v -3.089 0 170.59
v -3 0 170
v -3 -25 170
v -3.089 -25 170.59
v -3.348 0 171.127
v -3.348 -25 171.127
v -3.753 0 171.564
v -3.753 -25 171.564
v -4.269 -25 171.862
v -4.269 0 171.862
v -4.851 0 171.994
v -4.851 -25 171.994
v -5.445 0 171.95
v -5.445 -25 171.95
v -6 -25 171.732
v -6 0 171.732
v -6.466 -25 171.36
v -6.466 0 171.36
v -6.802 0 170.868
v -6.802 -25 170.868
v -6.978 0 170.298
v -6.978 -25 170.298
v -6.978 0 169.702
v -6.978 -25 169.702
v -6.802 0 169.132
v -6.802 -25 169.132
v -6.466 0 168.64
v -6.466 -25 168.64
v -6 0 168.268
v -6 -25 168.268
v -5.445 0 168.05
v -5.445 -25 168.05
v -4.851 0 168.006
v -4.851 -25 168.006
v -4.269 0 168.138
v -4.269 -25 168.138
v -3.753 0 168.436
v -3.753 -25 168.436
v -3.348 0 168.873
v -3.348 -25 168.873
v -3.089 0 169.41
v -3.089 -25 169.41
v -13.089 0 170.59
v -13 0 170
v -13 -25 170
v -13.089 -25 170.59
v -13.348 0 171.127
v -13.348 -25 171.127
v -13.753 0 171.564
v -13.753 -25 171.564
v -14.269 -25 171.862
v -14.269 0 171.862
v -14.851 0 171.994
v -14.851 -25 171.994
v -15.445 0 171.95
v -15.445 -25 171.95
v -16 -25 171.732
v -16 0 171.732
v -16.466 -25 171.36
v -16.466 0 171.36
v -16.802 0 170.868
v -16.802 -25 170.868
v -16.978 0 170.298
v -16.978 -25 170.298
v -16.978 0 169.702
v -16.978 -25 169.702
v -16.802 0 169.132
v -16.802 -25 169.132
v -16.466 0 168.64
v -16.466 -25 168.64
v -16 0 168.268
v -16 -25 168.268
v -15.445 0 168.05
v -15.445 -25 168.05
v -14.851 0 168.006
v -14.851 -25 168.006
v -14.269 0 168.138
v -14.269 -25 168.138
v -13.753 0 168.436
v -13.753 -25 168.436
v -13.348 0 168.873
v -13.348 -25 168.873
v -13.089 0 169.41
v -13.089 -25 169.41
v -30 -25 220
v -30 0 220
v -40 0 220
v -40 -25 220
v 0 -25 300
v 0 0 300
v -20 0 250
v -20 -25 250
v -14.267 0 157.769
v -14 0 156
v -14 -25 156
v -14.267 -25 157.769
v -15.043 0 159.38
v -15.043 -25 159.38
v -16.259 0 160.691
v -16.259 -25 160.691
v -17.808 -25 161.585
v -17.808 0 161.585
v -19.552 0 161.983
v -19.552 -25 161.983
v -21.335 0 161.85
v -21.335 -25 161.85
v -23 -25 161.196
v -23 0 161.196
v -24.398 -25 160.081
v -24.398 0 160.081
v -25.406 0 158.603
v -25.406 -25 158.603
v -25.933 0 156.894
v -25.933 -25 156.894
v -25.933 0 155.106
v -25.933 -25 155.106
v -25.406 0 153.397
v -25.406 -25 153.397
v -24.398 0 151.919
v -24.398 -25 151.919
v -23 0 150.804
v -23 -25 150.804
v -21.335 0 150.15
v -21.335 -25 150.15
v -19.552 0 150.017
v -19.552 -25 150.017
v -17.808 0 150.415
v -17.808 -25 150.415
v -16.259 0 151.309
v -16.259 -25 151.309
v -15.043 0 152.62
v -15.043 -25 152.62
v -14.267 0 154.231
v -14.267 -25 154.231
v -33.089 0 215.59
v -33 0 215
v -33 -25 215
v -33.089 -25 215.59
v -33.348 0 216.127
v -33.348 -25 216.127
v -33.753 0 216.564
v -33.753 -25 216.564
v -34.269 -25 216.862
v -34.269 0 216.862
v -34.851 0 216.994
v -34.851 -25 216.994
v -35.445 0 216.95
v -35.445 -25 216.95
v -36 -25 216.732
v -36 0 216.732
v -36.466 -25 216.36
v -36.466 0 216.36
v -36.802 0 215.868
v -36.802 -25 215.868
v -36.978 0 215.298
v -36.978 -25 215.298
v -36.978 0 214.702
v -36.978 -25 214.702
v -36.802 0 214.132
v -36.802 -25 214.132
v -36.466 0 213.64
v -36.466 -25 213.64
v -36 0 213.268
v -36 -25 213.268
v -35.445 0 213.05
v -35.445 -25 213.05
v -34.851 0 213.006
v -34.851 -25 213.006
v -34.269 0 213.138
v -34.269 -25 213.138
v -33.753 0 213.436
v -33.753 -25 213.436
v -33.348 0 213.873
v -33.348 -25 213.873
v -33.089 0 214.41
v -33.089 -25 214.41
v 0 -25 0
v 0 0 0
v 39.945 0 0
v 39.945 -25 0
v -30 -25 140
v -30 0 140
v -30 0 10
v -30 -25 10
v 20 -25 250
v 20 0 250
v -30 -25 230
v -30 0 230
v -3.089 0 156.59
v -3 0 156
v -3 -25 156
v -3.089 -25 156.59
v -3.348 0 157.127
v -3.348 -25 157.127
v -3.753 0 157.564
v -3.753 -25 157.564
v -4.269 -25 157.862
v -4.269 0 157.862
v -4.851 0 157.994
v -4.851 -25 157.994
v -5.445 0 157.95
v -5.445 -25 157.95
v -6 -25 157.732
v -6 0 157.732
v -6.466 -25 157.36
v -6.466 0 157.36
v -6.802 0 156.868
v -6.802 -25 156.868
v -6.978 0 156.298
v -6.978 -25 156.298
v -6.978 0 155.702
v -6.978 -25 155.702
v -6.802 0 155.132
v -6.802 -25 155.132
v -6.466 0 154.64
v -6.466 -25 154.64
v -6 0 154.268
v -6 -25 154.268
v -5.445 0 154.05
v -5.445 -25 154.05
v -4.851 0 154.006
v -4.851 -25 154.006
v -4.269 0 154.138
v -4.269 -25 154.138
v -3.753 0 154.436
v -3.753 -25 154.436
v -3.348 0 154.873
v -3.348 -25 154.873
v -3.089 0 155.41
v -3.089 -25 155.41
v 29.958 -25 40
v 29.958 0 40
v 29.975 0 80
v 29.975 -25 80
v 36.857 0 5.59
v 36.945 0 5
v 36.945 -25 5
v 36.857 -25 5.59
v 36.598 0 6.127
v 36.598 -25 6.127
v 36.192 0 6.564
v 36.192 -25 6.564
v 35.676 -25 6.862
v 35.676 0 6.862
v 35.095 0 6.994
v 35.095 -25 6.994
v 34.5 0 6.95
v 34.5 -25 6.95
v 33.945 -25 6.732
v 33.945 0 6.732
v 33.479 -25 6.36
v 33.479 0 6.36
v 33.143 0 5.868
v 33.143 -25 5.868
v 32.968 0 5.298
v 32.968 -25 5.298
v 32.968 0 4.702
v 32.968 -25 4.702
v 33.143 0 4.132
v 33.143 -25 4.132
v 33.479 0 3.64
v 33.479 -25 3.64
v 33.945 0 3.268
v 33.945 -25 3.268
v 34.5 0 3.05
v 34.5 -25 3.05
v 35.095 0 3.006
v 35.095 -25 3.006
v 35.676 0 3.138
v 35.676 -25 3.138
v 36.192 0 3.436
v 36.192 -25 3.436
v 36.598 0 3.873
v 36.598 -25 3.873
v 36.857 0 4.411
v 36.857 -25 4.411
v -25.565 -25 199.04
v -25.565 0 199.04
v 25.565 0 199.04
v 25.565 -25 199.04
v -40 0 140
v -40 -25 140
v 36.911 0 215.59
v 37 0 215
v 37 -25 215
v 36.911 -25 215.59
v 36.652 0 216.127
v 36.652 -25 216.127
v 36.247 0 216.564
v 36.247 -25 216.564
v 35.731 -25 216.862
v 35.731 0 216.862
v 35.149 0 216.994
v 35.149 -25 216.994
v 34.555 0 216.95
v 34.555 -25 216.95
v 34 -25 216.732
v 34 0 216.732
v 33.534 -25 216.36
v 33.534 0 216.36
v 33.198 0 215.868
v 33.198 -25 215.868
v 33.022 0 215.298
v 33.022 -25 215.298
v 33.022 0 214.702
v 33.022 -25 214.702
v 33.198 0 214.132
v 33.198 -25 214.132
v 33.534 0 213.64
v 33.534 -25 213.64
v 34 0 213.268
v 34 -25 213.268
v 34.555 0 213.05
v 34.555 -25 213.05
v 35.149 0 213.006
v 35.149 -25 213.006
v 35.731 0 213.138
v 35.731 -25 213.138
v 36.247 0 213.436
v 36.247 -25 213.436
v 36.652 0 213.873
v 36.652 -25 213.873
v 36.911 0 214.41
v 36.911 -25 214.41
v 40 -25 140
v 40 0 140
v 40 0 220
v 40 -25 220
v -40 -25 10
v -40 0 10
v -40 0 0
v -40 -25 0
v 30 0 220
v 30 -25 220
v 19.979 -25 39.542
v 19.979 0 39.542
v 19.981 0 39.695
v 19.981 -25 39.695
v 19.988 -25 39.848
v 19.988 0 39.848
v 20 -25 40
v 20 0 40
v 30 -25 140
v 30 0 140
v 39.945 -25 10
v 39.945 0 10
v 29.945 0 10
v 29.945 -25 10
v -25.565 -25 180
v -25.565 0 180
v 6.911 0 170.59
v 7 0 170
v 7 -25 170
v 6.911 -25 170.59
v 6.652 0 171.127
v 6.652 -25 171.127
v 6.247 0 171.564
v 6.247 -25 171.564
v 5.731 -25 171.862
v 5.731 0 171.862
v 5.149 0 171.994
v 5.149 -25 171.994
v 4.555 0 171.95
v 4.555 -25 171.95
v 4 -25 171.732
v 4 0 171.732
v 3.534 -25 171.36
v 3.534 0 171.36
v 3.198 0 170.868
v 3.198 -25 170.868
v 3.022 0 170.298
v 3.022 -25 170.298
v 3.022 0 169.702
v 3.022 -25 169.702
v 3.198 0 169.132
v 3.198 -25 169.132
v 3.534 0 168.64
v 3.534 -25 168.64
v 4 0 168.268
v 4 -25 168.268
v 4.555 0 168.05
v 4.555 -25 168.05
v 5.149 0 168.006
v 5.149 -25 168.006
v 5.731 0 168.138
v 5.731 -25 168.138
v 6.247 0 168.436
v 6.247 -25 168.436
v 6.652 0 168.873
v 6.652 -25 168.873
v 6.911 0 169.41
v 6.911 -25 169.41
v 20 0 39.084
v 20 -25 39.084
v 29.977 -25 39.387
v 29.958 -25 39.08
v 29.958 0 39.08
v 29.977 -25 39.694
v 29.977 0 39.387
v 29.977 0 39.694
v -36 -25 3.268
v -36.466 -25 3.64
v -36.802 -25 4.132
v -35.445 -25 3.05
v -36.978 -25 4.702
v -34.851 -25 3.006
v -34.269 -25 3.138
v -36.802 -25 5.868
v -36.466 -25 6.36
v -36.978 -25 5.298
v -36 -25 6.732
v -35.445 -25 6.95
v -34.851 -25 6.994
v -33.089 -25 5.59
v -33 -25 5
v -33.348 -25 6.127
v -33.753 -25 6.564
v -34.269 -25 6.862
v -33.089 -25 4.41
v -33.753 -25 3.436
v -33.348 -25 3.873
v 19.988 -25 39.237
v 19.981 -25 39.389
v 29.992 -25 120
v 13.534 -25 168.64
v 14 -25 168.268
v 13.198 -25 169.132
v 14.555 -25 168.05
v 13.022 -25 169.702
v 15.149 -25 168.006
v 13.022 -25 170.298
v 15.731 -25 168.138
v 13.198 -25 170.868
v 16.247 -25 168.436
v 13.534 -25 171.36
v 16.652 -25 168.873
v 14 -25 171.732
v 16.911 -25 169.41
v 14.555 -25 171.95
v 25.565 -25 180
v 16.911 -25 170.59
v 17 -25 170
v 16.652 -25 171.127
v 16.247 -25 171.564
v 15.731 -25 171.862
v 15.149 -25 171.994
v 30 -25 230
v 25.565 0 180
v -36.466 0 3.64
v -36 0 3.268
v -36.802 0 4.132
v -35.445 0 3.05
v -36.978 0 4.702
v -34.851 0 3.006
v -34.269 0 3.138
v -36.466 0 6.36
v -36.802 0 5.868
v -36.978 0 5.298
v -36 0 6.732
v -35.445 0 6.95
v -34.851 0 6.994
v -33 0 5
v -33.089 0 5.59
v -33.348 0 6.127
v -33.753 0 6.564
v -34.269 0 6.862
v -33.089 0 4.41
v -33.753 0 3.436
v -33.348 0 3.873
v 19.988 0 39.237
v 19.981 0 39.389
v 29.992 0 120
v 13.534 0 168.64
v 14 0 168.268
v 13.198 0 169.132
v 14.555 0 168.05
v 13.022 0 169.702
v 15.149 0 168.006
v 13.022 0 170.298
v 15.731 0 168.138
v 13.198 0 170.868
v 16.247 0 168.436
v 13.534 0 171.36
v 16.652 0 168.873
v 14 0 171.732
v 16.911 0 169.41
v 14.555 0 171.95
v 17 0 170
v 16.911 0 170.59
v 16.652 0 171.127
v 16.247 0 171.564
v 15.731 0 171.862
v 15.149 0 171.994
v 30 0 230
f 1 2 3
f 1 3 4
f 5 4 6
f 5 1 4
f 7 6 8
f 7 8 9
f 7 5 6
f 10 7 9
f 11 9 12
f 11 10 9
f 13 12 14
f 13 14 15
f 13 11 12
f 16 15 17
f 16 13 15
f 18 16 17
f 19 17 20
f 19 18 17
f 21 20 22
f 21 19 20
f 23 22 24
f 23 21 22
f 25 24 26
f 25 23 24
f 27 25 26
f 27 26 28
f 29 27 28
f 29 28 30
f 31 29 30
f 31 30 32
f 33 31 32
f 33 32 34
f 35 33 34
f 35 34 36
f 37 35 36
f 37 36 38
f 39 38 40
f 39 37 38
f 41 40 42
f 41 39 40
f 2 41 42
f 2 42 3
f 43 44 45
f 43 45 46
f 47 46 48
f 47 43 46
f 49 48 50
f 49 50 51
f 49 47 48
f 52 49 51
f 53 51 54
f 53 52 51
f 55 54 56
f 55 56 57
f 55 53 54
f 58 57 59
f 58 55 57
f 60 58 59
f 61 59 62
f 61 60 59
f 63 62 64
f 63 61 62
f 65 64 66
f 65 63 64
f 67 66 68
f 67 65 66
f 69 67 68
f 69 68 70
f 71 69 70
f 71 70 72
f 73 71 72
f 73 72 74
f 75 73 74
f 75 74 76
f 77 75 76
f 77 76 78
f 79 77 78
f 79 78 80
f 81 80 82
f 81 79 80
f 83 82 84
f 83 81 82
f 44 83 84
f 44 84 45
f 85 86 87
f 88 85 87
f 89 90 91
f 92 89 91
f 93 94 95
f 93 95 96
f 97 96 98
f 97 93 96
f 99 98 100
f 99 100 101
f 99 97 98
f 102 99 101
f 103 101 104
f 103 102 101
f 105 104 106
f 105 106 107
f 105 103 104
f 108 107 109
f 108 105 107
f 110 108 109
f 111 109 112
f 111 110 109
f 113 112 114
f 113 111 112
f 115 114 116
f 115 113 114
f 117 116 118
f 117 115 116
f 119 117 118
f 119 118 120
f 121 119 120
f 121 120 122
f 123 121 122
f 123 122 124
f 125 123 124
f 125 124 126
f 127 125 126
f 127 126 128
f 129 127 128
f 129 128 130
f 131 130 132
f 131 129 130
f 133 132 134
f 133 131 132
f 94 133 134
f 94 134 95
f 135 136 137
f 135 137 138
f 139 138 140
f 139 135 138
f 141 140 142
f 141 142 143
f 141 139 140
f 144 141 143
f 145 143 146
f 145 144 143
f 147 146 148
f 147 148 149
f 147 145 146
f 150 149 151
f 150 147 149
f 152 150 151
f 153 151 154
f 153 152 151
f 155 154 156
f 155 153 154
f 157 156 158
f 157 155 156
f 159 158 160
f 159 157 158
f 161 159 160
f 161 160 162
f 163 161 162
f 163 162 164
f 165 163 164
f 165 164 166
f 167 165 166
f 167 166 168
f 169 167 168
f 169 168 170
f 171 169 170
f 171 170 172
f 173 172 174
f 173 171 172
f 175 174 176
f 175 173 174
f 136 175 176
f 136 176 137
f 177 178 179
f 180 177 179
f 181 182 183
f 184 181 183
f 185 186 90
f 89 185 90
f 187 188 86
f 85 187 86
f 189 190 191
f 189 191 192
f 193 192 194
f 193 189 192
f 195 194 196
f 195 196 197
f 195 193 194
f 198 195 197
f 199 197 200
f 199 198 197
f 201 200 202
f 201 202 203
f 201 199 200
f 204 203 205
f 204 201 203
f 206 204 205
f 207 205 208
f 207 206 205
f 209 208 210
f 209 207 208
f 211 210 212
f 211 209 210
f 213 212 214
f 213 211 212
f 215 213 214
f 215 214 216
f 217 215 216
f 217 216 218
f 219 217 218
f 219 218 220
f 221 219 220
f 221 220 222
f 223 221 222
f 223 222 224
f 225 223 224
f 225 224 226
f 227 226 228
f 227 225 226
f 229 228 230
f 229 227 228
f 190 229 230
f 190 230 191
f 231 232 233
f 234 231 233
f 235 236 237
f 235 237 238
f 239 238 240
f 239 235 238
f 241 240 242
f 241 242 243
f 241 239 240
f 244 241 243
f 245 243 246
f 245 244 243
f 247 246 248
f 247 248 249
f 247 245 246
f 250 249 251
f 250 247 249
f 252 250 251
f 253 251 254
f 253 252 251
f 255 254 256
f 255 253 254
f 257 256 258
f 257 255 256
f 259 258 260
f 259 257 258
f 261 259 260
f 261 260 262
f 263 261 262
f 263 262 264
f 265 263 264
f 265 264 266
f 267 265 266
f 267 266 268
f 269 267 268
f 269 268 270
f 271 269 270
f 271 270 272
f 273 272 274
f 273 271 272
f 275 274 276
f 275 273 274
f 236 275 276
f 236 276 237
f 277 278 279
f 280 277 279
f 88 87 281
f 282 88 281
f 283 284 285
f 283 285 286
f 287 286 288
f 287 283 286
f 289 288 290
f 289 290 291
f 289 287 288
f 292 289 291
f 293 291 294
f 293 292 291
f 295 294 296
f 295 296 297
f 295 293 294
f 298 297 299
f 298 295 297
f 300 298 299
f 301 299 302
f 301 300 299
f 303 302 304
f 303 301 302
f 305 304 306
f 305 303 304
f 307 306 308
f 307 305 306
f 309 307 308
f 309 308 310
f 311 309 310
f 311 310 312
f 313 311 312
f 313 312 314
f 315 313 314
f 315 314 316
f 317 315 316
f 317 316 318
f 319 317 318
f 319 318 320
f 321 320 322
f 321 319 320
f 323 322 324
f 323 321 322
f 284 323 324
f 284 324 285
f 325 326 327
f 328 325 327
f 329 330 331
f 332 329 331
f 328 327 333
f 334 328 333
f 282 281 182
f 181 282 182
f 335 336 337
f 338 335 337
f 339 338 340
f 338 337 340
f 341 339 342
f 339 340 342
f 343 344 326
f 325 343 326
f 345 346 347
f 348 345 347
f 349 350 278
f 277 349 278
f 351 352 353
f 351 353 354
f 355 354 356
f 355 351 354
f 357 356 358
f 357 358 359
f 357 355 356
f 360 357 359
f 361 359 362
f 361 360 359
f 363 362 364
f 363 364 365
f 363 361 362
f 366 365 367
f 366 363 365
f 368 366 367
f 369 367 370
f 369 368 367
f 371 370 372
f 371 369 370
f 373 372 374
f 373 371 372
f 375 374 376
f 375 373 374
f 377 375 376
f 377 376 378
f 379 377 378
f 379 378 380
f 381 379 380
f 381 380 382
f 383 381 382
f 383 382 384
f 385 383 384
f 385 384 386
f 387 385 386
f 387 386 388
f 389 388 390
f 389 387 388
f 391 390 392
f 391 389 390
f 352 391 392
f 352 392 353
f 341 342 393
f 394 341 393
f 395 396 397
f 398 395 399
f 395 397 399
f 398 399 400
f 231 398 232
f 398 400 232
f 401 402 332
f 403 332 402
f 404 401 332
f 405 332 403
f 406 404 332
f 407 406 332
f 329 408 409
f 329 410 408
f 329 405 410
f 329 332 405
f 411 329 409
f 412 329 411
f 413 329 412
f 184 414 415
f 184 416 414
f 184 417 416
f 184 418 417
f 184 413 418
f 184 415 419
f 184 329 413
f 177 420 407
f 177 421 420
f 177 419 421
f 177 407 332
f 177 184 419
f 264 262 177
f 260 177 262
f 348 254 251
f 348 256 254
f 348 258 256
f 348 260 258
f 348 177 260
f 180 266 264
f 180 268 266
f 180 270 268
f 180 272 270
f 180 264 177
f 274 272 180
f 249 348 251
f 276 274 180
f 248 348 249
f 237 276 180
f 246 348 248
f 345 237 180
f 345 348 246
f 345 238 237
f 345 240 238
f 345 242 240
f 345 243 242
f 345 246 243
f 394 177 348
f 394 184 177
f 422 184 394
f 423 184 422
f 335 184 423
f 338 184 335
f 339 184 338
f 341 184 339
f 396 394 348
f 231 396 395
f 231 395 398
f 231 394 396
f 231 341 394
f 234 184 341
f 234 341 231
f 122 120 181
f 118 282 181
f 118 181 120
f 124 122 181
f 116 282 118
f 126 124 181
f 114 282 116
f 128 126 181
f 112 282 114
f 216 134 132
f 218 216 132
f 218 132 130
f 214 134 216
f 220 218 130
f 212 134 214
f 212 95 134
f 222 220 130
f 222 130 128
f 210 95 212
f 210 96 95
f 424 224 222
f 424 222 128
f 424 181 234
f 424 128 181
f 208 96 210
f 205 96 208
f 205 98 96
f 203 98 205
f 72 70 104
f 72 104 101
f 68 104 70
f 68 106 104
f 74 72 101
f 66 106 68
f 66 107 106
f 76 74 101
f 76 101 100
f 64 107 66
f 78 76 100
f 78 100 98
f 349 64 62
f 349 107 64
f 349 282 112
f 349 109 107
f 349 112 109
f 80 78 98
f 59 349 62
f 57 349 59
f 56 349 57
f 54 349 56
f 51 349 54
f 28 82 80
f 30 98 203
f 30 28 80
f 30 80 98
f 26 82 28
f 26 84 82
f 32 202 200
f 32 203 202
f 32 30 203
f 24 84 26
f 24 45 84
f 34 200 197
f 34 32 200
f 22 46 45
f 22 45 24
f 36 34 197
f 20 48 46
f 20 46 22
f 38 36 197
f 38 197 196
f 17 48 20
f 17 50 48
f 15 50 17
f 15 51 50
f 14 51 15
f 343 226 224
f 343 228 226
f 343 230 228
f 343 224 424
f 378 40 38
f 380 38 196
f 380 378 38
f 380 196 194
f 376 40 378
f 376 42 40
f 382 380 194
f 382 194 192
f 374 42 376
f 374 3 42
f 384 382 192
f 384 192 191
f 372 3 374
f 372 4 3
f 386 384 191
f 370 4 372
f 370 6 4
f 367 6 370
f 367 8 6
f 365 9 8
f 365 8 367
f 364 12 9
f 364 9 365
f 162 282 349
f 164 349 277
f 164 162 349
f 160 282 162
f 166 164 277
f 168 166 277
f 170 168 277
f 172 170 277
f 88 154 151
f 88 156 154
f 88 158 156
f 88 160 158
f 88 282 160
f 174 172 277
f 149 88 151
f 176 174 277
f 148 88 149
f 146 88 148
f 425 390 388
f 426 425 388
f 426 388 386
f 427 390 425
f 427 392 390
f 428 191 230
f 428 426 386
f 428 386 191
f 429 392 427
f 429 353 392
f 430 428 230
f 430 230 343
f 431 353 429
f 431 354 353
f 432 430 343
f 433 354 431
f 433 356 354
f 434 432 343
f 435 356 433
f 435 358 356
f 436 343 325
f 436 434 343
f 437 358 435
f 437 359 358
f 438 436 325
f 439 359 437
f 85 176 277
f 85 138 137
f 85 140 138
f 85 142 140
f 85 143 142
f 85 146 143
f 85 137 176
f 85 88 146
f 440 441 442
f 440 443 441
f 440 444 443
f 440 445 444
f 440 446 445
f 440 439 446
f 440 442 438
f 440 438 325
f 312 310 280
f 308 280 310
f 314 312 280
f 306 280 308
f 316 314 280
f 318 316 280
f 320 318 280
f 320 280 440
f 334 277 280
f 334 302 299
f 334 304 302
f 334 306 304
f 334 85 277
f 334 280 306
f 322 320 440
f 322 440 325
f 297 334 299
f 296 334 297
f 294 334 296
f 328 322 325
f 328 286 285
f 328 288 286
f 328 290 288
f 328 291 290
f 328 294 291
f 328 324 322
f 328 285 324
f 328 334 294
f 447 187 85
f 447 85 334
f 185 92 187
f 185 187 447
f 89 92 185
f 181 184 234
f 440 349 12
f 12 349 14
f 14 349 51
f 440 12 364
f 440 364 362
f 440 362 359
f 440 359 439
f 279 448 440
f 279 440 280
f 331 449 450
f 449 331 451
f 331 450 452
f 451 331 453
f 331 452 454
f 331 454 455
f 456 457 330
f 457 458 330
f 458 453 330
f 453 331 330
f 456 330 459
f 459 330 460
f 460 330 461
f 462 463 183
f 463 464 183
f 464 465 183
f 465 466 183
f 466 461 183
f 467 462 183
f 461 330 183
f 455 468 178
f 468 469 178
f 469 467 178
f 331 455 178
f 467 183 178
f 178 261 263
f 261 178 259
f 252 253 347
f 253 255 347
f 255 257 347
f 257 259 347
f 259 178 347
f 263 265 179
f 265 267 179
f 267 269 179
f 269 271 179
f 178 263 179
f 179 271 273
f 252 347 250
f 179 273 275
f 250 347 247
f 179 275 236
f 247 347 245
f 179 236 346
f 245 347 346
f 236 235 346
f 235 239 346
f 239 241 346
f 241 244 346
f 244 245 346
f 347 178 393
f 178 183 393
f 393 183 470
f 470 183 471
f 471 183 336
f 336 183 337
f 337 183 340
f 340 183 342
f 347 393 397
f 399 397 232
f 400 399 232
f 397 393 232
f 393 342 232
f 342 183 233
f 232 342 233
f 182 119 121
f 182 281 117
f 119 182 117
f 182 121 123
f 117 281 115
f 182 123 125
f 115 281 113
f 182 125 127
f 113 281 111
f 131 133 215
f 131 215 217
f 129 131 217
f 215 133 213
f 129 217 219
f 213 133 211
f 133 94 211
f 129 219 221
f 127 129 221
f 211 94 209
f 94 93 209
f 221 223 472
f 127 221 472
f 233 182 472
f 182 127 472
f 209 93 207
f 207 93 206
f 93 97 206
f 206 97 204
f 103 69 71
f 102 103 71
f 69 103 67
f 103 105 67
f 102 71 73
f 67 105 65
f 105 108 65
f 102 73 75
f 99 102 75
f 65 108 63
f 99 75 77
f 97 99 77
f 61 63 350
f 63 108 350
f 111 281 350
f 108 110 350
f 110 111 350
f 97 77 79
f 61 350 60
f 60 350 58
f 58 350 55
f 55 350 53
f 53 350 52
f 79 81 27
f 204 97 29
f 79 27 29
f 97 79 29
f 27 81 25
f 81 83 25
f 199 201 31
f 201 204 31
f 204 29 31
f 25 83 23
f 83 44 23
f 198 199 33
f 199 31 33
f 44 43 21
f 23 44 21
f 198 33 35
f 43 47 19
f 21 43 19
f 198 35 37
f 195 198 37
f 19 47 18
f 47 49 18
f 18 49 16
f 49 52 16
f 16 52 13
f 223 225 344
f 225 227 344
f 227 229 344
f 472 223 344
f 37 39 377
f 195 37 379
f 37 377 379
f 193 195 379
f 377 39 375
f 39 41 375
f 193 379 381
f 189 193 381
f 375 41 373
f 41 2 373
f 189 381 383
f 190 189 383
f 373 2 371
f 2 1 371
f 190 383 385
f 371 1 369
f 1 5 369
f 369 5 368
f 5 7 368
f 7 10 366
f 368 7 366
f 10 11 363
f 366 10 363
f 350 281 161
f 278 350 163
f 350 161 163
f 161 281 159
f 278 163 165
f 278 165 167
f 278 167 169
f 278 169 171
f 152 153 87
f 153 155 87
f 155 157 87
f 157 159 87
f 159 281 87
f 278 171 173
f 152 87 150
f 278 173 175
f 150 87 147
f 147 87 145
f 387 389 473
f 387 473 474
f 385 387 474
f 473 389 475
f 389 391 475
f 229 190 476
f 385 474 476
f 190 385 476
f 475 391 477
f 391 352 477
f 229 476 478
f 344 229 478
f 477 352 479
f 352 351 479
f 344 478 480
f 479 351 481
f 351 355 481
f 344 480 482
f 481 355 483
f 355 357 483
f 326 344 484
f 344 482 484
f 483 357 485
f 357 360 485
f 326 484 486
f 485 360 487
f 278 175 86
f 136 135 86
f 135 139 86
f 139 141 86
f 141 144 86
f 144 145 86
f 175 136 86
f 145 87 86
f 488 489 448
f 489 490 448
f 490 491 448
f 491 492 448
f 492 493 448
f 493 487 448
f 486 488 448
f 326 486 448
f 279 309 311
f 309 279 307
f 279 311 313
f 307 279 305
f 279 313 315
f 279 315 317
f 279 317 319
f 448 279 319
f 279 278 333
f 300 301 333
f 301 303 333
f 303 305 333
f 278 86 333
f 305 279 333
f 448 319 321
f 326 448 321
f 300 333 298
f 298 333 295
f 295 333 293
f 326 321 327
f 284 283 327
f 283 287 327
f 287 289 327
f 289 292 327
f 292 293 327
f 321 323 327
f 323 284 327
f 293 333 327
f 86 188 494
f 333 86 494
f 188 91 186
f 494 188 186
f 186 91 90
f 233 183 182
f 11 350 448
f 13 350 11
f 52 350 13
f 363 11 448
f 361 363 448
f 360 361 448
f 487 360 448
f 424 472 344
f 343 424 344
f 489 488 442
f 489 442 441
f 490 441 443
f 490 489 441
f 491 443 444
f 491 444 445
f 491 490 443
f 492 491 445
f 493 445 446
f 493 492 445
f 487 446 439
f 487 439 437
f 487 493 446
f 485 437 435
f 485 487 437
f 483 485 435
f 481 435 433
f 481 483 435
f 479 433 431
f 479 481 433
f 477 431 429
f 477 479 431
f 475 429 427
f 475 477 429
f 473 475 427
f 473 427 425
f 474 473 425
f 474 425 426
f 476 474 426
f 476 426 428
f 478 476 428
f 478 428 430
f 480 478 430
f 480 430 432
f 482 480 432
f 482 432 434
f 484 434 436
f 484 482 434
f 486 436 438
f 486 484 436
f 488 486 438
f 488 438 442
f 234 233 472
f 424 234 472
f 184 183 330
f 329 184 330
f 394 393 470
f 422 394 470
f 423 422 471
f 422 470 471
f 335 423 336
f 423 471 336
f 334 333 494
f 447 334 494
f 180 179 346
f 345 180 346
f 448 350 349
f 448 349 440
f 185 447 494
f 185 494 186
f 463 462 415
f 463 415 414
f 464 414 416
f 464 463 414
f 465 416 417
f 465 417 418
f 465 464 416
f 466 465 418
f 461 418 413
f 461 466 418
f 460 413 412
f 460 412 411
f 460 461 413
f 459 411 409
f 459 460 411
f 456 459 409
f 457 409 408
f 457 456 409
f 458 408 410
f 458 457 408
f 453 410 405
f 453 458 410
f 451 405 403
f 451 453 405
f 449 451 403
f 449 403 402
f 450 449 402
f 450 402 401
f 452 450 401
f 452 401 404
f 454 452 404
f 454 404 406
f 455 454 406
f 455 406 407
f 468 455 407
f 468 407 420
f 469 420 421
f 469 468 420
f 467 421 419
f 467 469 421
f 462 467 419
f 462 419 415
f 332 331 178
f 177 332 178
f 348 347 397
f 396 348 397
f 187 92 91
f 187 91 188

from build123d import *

# Parameters (mm, degrees)
F0_R     = 2
F0_R_2   = 6
F0_W     = 51.13
F0_H     = 19.04
F1_DEPTH = 25


# Not quite as in the source:
# - ends of sketch curves that miss each other by under 0.0002 mm in the source are joined


with BuildPart() as f1:
    # F0 (on Front) → F1 (new body)
    with BuildSketch(Plane.XZ):
        with BuildLine():
            Line((-0.0546134975, 0), (0, 0))
            Line((0, 0), (39.9453865025, 1.14717e-05))
            Line((39.9453865025, 1.14717e-05), (39.9453865025, 10.0000114717))
            Line((39.9453865025, 10.0000114717), (29.9453865025, 10.0000114717))
            Line((29.9453865025, 10.0000114717), (29.9576031817, 39.0801515195))
            ThreePointArc((29.9576031817, 39.0801515195), (24.9768942877, 34.5421678148), (20, 39.0843347471))
            ThreePointArc((20, 39.0843347471), (19.9842488656, 39.3130102593), (19.9789948068, 39.5421673735))
            ThreePointArc((19.9789948068, 39.5421673735), (14.7708428858, 35.0052540588), (10, 40))
            ThreePointArc((10, 40), (5, 35), (0, 40))
            ThreePointArc((0, 40), (-5, 35), (-10, 40))
            ThreePointArc((-10, 40), (-15, 35), (-20, 40))
            ThreePointArc((-20, 40), (-25, 35), (-30, 40))
            Line((-30, 40), (-30, 10))
            Line((-30, 10), (-40, 10))
            Line((-40, 10), (-40, 0))
            Line((-40, 0), (-0.0546134975, 0))
        make_face()
        with Locations((-35, 5)):
            Circle(F0_R, mode=Mode.SUBTRACT)
        with Locations((34.9453865025, 5.0000114717)):
            Circle(F0_R, mode=Mode.SUBTRACT)
        with BuildLine():
            ThreePointArc((20, 39.0843347471), (24.9768942877, 34.5421678148), (29.9576031817, 39.0801515195))
            Line((29.9576031817, 39.0801515195), (29.9579896136, 40))
            Line((29.9579896136, 40), (29.9747937682, 80))
            ThreePointArc((29.9747937682, 80), (24.9873968841, 75.3547848935), (20, 80))
            Line((20, 80), (20, 40))
            Line((20, 40), (20, 39.0843347471))
        make_face()
        with BuildLine():
            Line((29.9579896136, 40), (29.9576031817, 39.0801515195))
            ThreePointArc((29.9576031817, 39.0801515195), (29.9789943656, 39.5400668544), (29.9579896136, 40))
        make_face()
        with BuildLine():
            Line((-30, 80), (-30, 40))
            ThreePointArc((-30, 40), (-25, 35), (-20, 40))
            Line((-20, 40), (-20, 80))
            ThreePointArc((-20, 80), (-25, 75), (-30, 80))
        make_face()
        with BuildLine():
            Line((-30, 120), (-30, 80))
            ThreePointArc((-30, 80), (-25, 75), (-20, 80))
            Line((-20, 80), (-20, 120))
            ThreePointArc((-20, 120), (-25, 115), (-30, 120))
        make_face()
        with BuildLine():
            ThreePointArc((20, 80), (24.9873968841, 75.3547848935), (29.9747937682, 80))
            Line((29.9747937682, 80), (29.9915979227, 120))
            ThreePointArc((29.9915979227, 120), (24.9957989614, 115.2049212963), (20, 120))
            Line((20, 120), (20, 80))
        make_face()
        with BuildLine():
            Line((-30, 140), (-30, 120))
            ThreePointArc((-30, 120), (-25, 115), (-20, 120))
            Line((-20, 120), (-20, 140))
            Line((-20, 140), (-30, 140))
        make_face()
        with BuildLine():
            ThreePointArc((20, 120), (24.9957989614, 115.2049212963), (29.9915979227, 120))
            Line((29.9915979227, 120), (30, 140))
            Line((30, 140), (20, 140))
            Line((20, 140), (20, 120))
        make_face()
        Polygon((-40, 140), (-30, 140), (-20, 140), (-10, 140), (0, 140), (10, 140), (20, 140), (30, 140), (40, 140), (40, 220), (30, 220), (-30, 220), (-40, 220), align=None)
        with Locations((-35, 215)):
            Circle(F0_R, mode=Mode.SUBTRACT)
        with Locations((-20, 156)):
            Circle(F0_R_2, mode=Mode.SUBTRACT)
        with Locations((-15, 170)):
            Circle(F0_R, mode=Mode.SUBTRACT)
        with Locations((-5, 156)):
            Circle(F0_R, mode=Mode.SUBTRACT)
        with Locations((-5, 170)):
            Circle(F0_R, mode=Mode.SUBTRACT)
        with Locations((5, 170)):
            Circle(F0_R, mode=Mode.SUBTRACT)
        with Locations((15, 170)):
            Circle(F0_R, mode=Mode.SUBTRACT)
        with Locations((0, 189.52)):
            Rectangle(F0_W, F0_H, mode=Mode.SUBTRACT)
        with Locations((35, 215)):
            Circle(F0_R, mode=Mode.SUBTRACT)
        Polygon((-30, 230), (-30, 220), (30, 220), (30, 230), (0, 230), align=None)
        Polygon((-20, 250), (-30, 230), (0, 230), (30, 230), (20, 250), (0, 250), align=None)
        Polygon((0, 300), (-20, 250), (0, 250), (20, 250), align=None)
        with BuildLine():
            Line((-20, 120), (-20, 80))
            ThreePointArc((-20, 80), (-15, 75), (-10, 80))
            Line((-10, 80), (-10, 120))
            ThreePointArc((-10, 120), (-15, 115), (-20, 120))
        make_face()
        with BuildLine():
            Line((-10, 120), (-10, 80))
            ThreePointArc((-10, 80), (-5, 75), (0, 80))
            Line((0, 80), (0, 120))
            ThreePointArc((0, 120), (-5, 115), (-10, 120))
        make_face()
        with BuildLine():
            ThreePointArc((0, 80), (5, 75), (10, 80))
            Line((10, 80), (10, 120))
            ThreePointArc((10, 120), (5, 115), (0, 120))
            Line((0, 120), (0, 80))
        make_face()
        with BuildLine():
            ThreePointArc((10, 80), (15, 75), (20, 80))
            Line((20, 80), (20, 120))
            ThreePointArc((20, 120), (15, 115), (10, 120))
            Line((10, 120), (10, 80))
        make_face()
        with BuildLine():
            ThreePointArc((19.9789948068, 39.5421673735), (19.9842488656, 39.7713244878), (20, 40))
            Line((20, 40), (20, 80))
            ThreePointArc((20, 80), (15, 75), (10, 80))
            Line((10, 80), (10, 40))
            ThreePointArc((10, 40), (14.7708428858, 35.0052540588), (19.9789948068, 39.5421673735))
        make_face()
        with BuildLine():
            ThreePointArc((0, 40), (5, 35), (10, 40))
            Line((10, 40), (10, 80))
            ThreePointArc((10, 80), (5, 75), (0, 80))
            Line((0, 80), (0, 40))
        make_face()
        with BuildLine():
            Line((-10, 80), (-10, 40))
            ThreePointArc((-10, 40), (-5, 35), (0, 40))
            Line((0, 40), (0, 80))
            ThreePointArc((0, 80), (-5, 75), (-10, 80))
        make_face()
        with BuildLine():
            Line((-20, 80), (-20, 40))
            ThreePointArc((-20, 40), (-15, 35), (-10, 40))
            Line((-10, 40), (-10, 80))
            ThreePointArc((-10, 80), (-15, 75), (-20, 80))
        make_face()
        with BuildLine():
            Line((-20, 140), (-20, 120))
            ThreePointArc((-20, 120), (-15, 115), (-10, 120))
            Line((-10, 120), (-10, 140))
            Line((-10, 140), (-20, 140))
        make_face()
        with BuildLine():
            Line((-10, 140), (-10, 120))
            ThreePointArc((-10, 120), (-5, 115), (0, 120))
            Line((0, 120), (0, 140))
            Line((0, 140), (-10, 140))
        make_face()
        with BuildLine():
            ThreePointArc((0, 120), (5, 115), (10, 120))
            Line((10, 120), (10, 140))
            Line((10, 140), (0, 140))
            Line((0, 140), (0, 120))
        make_face()
        with BuildLine():
            ThreePointArc((10, 120), (15, 115), (20, 120))
            Line((20, 120), (20, 140))
            Line((20, 140), (10, 140))
            Line((10, 140), (10, 120))
        make_face()
    extrude(amount=F1_DEPTH)


solid = f1.part
